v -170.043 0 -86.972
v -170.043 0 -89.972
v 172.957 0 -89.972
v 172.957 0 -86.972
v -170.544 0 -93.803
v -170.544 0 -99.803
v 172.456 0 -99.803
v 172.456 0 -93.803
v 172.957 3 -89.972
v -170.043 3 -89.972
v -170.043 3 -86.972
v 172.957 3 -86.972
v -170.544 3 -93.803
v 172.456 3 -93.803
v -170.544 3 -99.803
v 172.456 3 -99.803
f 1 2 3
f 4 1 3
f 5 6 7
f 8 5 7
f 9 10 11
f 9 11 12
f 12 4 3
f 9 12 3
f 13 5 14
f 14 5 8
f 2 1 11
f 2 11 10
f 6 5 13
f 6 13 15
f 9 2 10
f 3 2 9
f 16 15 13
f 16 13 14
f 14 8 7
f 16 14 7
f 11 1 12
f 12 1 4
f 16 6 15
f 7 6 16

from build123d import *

# Parameters (mm, degrees)
SKETCH1_W           = 343
SKETCH1_H           = 6
BOSS_EXTRUDE1_DEPTH = 3
SKETCH2_W           = 343
SKETCH2_H           = 3
BOSS_EXTRUDE2_DEPTH = 3


with BuildPart() as part:
    # Sketch1 → Boss-Extrude1 (new body)
    with BuildSketch(Plane(origin=(0, 0, 0), x_dir=(1, 0, 0), z_dir=(0, 1, 0))):
        with Locations((0.955964326, 96.802675585)):
            Rectangle(SKETCH1_W, SKETCH1_H)
    extrude(amount=BOSS_EXTRUDE1_DEPTH)


with BuildPart() as body_2:
    # Sketch2 → Boss-Extrude2 (new body)
    with BuildSketch(Plane(origin=(0, 0, 0), x_dir=(1, 0, 0), z_dir=(0, 1, 0))):
        with Locations((39.074390418, 37.5183443)):
            Rectangle(SKETCH2_W, SKETCH2_H)
    extrude(amount=BOSS_EXTRUDE2_DEPTH)


with BuildPart() as body_2_1:
    # Body-Move/Copy1: moved
    add(body_2.part.moved(Location((-37.617381319, 0, -50.953198615))))


solid = Compound([part.part, body_2_1.part])
